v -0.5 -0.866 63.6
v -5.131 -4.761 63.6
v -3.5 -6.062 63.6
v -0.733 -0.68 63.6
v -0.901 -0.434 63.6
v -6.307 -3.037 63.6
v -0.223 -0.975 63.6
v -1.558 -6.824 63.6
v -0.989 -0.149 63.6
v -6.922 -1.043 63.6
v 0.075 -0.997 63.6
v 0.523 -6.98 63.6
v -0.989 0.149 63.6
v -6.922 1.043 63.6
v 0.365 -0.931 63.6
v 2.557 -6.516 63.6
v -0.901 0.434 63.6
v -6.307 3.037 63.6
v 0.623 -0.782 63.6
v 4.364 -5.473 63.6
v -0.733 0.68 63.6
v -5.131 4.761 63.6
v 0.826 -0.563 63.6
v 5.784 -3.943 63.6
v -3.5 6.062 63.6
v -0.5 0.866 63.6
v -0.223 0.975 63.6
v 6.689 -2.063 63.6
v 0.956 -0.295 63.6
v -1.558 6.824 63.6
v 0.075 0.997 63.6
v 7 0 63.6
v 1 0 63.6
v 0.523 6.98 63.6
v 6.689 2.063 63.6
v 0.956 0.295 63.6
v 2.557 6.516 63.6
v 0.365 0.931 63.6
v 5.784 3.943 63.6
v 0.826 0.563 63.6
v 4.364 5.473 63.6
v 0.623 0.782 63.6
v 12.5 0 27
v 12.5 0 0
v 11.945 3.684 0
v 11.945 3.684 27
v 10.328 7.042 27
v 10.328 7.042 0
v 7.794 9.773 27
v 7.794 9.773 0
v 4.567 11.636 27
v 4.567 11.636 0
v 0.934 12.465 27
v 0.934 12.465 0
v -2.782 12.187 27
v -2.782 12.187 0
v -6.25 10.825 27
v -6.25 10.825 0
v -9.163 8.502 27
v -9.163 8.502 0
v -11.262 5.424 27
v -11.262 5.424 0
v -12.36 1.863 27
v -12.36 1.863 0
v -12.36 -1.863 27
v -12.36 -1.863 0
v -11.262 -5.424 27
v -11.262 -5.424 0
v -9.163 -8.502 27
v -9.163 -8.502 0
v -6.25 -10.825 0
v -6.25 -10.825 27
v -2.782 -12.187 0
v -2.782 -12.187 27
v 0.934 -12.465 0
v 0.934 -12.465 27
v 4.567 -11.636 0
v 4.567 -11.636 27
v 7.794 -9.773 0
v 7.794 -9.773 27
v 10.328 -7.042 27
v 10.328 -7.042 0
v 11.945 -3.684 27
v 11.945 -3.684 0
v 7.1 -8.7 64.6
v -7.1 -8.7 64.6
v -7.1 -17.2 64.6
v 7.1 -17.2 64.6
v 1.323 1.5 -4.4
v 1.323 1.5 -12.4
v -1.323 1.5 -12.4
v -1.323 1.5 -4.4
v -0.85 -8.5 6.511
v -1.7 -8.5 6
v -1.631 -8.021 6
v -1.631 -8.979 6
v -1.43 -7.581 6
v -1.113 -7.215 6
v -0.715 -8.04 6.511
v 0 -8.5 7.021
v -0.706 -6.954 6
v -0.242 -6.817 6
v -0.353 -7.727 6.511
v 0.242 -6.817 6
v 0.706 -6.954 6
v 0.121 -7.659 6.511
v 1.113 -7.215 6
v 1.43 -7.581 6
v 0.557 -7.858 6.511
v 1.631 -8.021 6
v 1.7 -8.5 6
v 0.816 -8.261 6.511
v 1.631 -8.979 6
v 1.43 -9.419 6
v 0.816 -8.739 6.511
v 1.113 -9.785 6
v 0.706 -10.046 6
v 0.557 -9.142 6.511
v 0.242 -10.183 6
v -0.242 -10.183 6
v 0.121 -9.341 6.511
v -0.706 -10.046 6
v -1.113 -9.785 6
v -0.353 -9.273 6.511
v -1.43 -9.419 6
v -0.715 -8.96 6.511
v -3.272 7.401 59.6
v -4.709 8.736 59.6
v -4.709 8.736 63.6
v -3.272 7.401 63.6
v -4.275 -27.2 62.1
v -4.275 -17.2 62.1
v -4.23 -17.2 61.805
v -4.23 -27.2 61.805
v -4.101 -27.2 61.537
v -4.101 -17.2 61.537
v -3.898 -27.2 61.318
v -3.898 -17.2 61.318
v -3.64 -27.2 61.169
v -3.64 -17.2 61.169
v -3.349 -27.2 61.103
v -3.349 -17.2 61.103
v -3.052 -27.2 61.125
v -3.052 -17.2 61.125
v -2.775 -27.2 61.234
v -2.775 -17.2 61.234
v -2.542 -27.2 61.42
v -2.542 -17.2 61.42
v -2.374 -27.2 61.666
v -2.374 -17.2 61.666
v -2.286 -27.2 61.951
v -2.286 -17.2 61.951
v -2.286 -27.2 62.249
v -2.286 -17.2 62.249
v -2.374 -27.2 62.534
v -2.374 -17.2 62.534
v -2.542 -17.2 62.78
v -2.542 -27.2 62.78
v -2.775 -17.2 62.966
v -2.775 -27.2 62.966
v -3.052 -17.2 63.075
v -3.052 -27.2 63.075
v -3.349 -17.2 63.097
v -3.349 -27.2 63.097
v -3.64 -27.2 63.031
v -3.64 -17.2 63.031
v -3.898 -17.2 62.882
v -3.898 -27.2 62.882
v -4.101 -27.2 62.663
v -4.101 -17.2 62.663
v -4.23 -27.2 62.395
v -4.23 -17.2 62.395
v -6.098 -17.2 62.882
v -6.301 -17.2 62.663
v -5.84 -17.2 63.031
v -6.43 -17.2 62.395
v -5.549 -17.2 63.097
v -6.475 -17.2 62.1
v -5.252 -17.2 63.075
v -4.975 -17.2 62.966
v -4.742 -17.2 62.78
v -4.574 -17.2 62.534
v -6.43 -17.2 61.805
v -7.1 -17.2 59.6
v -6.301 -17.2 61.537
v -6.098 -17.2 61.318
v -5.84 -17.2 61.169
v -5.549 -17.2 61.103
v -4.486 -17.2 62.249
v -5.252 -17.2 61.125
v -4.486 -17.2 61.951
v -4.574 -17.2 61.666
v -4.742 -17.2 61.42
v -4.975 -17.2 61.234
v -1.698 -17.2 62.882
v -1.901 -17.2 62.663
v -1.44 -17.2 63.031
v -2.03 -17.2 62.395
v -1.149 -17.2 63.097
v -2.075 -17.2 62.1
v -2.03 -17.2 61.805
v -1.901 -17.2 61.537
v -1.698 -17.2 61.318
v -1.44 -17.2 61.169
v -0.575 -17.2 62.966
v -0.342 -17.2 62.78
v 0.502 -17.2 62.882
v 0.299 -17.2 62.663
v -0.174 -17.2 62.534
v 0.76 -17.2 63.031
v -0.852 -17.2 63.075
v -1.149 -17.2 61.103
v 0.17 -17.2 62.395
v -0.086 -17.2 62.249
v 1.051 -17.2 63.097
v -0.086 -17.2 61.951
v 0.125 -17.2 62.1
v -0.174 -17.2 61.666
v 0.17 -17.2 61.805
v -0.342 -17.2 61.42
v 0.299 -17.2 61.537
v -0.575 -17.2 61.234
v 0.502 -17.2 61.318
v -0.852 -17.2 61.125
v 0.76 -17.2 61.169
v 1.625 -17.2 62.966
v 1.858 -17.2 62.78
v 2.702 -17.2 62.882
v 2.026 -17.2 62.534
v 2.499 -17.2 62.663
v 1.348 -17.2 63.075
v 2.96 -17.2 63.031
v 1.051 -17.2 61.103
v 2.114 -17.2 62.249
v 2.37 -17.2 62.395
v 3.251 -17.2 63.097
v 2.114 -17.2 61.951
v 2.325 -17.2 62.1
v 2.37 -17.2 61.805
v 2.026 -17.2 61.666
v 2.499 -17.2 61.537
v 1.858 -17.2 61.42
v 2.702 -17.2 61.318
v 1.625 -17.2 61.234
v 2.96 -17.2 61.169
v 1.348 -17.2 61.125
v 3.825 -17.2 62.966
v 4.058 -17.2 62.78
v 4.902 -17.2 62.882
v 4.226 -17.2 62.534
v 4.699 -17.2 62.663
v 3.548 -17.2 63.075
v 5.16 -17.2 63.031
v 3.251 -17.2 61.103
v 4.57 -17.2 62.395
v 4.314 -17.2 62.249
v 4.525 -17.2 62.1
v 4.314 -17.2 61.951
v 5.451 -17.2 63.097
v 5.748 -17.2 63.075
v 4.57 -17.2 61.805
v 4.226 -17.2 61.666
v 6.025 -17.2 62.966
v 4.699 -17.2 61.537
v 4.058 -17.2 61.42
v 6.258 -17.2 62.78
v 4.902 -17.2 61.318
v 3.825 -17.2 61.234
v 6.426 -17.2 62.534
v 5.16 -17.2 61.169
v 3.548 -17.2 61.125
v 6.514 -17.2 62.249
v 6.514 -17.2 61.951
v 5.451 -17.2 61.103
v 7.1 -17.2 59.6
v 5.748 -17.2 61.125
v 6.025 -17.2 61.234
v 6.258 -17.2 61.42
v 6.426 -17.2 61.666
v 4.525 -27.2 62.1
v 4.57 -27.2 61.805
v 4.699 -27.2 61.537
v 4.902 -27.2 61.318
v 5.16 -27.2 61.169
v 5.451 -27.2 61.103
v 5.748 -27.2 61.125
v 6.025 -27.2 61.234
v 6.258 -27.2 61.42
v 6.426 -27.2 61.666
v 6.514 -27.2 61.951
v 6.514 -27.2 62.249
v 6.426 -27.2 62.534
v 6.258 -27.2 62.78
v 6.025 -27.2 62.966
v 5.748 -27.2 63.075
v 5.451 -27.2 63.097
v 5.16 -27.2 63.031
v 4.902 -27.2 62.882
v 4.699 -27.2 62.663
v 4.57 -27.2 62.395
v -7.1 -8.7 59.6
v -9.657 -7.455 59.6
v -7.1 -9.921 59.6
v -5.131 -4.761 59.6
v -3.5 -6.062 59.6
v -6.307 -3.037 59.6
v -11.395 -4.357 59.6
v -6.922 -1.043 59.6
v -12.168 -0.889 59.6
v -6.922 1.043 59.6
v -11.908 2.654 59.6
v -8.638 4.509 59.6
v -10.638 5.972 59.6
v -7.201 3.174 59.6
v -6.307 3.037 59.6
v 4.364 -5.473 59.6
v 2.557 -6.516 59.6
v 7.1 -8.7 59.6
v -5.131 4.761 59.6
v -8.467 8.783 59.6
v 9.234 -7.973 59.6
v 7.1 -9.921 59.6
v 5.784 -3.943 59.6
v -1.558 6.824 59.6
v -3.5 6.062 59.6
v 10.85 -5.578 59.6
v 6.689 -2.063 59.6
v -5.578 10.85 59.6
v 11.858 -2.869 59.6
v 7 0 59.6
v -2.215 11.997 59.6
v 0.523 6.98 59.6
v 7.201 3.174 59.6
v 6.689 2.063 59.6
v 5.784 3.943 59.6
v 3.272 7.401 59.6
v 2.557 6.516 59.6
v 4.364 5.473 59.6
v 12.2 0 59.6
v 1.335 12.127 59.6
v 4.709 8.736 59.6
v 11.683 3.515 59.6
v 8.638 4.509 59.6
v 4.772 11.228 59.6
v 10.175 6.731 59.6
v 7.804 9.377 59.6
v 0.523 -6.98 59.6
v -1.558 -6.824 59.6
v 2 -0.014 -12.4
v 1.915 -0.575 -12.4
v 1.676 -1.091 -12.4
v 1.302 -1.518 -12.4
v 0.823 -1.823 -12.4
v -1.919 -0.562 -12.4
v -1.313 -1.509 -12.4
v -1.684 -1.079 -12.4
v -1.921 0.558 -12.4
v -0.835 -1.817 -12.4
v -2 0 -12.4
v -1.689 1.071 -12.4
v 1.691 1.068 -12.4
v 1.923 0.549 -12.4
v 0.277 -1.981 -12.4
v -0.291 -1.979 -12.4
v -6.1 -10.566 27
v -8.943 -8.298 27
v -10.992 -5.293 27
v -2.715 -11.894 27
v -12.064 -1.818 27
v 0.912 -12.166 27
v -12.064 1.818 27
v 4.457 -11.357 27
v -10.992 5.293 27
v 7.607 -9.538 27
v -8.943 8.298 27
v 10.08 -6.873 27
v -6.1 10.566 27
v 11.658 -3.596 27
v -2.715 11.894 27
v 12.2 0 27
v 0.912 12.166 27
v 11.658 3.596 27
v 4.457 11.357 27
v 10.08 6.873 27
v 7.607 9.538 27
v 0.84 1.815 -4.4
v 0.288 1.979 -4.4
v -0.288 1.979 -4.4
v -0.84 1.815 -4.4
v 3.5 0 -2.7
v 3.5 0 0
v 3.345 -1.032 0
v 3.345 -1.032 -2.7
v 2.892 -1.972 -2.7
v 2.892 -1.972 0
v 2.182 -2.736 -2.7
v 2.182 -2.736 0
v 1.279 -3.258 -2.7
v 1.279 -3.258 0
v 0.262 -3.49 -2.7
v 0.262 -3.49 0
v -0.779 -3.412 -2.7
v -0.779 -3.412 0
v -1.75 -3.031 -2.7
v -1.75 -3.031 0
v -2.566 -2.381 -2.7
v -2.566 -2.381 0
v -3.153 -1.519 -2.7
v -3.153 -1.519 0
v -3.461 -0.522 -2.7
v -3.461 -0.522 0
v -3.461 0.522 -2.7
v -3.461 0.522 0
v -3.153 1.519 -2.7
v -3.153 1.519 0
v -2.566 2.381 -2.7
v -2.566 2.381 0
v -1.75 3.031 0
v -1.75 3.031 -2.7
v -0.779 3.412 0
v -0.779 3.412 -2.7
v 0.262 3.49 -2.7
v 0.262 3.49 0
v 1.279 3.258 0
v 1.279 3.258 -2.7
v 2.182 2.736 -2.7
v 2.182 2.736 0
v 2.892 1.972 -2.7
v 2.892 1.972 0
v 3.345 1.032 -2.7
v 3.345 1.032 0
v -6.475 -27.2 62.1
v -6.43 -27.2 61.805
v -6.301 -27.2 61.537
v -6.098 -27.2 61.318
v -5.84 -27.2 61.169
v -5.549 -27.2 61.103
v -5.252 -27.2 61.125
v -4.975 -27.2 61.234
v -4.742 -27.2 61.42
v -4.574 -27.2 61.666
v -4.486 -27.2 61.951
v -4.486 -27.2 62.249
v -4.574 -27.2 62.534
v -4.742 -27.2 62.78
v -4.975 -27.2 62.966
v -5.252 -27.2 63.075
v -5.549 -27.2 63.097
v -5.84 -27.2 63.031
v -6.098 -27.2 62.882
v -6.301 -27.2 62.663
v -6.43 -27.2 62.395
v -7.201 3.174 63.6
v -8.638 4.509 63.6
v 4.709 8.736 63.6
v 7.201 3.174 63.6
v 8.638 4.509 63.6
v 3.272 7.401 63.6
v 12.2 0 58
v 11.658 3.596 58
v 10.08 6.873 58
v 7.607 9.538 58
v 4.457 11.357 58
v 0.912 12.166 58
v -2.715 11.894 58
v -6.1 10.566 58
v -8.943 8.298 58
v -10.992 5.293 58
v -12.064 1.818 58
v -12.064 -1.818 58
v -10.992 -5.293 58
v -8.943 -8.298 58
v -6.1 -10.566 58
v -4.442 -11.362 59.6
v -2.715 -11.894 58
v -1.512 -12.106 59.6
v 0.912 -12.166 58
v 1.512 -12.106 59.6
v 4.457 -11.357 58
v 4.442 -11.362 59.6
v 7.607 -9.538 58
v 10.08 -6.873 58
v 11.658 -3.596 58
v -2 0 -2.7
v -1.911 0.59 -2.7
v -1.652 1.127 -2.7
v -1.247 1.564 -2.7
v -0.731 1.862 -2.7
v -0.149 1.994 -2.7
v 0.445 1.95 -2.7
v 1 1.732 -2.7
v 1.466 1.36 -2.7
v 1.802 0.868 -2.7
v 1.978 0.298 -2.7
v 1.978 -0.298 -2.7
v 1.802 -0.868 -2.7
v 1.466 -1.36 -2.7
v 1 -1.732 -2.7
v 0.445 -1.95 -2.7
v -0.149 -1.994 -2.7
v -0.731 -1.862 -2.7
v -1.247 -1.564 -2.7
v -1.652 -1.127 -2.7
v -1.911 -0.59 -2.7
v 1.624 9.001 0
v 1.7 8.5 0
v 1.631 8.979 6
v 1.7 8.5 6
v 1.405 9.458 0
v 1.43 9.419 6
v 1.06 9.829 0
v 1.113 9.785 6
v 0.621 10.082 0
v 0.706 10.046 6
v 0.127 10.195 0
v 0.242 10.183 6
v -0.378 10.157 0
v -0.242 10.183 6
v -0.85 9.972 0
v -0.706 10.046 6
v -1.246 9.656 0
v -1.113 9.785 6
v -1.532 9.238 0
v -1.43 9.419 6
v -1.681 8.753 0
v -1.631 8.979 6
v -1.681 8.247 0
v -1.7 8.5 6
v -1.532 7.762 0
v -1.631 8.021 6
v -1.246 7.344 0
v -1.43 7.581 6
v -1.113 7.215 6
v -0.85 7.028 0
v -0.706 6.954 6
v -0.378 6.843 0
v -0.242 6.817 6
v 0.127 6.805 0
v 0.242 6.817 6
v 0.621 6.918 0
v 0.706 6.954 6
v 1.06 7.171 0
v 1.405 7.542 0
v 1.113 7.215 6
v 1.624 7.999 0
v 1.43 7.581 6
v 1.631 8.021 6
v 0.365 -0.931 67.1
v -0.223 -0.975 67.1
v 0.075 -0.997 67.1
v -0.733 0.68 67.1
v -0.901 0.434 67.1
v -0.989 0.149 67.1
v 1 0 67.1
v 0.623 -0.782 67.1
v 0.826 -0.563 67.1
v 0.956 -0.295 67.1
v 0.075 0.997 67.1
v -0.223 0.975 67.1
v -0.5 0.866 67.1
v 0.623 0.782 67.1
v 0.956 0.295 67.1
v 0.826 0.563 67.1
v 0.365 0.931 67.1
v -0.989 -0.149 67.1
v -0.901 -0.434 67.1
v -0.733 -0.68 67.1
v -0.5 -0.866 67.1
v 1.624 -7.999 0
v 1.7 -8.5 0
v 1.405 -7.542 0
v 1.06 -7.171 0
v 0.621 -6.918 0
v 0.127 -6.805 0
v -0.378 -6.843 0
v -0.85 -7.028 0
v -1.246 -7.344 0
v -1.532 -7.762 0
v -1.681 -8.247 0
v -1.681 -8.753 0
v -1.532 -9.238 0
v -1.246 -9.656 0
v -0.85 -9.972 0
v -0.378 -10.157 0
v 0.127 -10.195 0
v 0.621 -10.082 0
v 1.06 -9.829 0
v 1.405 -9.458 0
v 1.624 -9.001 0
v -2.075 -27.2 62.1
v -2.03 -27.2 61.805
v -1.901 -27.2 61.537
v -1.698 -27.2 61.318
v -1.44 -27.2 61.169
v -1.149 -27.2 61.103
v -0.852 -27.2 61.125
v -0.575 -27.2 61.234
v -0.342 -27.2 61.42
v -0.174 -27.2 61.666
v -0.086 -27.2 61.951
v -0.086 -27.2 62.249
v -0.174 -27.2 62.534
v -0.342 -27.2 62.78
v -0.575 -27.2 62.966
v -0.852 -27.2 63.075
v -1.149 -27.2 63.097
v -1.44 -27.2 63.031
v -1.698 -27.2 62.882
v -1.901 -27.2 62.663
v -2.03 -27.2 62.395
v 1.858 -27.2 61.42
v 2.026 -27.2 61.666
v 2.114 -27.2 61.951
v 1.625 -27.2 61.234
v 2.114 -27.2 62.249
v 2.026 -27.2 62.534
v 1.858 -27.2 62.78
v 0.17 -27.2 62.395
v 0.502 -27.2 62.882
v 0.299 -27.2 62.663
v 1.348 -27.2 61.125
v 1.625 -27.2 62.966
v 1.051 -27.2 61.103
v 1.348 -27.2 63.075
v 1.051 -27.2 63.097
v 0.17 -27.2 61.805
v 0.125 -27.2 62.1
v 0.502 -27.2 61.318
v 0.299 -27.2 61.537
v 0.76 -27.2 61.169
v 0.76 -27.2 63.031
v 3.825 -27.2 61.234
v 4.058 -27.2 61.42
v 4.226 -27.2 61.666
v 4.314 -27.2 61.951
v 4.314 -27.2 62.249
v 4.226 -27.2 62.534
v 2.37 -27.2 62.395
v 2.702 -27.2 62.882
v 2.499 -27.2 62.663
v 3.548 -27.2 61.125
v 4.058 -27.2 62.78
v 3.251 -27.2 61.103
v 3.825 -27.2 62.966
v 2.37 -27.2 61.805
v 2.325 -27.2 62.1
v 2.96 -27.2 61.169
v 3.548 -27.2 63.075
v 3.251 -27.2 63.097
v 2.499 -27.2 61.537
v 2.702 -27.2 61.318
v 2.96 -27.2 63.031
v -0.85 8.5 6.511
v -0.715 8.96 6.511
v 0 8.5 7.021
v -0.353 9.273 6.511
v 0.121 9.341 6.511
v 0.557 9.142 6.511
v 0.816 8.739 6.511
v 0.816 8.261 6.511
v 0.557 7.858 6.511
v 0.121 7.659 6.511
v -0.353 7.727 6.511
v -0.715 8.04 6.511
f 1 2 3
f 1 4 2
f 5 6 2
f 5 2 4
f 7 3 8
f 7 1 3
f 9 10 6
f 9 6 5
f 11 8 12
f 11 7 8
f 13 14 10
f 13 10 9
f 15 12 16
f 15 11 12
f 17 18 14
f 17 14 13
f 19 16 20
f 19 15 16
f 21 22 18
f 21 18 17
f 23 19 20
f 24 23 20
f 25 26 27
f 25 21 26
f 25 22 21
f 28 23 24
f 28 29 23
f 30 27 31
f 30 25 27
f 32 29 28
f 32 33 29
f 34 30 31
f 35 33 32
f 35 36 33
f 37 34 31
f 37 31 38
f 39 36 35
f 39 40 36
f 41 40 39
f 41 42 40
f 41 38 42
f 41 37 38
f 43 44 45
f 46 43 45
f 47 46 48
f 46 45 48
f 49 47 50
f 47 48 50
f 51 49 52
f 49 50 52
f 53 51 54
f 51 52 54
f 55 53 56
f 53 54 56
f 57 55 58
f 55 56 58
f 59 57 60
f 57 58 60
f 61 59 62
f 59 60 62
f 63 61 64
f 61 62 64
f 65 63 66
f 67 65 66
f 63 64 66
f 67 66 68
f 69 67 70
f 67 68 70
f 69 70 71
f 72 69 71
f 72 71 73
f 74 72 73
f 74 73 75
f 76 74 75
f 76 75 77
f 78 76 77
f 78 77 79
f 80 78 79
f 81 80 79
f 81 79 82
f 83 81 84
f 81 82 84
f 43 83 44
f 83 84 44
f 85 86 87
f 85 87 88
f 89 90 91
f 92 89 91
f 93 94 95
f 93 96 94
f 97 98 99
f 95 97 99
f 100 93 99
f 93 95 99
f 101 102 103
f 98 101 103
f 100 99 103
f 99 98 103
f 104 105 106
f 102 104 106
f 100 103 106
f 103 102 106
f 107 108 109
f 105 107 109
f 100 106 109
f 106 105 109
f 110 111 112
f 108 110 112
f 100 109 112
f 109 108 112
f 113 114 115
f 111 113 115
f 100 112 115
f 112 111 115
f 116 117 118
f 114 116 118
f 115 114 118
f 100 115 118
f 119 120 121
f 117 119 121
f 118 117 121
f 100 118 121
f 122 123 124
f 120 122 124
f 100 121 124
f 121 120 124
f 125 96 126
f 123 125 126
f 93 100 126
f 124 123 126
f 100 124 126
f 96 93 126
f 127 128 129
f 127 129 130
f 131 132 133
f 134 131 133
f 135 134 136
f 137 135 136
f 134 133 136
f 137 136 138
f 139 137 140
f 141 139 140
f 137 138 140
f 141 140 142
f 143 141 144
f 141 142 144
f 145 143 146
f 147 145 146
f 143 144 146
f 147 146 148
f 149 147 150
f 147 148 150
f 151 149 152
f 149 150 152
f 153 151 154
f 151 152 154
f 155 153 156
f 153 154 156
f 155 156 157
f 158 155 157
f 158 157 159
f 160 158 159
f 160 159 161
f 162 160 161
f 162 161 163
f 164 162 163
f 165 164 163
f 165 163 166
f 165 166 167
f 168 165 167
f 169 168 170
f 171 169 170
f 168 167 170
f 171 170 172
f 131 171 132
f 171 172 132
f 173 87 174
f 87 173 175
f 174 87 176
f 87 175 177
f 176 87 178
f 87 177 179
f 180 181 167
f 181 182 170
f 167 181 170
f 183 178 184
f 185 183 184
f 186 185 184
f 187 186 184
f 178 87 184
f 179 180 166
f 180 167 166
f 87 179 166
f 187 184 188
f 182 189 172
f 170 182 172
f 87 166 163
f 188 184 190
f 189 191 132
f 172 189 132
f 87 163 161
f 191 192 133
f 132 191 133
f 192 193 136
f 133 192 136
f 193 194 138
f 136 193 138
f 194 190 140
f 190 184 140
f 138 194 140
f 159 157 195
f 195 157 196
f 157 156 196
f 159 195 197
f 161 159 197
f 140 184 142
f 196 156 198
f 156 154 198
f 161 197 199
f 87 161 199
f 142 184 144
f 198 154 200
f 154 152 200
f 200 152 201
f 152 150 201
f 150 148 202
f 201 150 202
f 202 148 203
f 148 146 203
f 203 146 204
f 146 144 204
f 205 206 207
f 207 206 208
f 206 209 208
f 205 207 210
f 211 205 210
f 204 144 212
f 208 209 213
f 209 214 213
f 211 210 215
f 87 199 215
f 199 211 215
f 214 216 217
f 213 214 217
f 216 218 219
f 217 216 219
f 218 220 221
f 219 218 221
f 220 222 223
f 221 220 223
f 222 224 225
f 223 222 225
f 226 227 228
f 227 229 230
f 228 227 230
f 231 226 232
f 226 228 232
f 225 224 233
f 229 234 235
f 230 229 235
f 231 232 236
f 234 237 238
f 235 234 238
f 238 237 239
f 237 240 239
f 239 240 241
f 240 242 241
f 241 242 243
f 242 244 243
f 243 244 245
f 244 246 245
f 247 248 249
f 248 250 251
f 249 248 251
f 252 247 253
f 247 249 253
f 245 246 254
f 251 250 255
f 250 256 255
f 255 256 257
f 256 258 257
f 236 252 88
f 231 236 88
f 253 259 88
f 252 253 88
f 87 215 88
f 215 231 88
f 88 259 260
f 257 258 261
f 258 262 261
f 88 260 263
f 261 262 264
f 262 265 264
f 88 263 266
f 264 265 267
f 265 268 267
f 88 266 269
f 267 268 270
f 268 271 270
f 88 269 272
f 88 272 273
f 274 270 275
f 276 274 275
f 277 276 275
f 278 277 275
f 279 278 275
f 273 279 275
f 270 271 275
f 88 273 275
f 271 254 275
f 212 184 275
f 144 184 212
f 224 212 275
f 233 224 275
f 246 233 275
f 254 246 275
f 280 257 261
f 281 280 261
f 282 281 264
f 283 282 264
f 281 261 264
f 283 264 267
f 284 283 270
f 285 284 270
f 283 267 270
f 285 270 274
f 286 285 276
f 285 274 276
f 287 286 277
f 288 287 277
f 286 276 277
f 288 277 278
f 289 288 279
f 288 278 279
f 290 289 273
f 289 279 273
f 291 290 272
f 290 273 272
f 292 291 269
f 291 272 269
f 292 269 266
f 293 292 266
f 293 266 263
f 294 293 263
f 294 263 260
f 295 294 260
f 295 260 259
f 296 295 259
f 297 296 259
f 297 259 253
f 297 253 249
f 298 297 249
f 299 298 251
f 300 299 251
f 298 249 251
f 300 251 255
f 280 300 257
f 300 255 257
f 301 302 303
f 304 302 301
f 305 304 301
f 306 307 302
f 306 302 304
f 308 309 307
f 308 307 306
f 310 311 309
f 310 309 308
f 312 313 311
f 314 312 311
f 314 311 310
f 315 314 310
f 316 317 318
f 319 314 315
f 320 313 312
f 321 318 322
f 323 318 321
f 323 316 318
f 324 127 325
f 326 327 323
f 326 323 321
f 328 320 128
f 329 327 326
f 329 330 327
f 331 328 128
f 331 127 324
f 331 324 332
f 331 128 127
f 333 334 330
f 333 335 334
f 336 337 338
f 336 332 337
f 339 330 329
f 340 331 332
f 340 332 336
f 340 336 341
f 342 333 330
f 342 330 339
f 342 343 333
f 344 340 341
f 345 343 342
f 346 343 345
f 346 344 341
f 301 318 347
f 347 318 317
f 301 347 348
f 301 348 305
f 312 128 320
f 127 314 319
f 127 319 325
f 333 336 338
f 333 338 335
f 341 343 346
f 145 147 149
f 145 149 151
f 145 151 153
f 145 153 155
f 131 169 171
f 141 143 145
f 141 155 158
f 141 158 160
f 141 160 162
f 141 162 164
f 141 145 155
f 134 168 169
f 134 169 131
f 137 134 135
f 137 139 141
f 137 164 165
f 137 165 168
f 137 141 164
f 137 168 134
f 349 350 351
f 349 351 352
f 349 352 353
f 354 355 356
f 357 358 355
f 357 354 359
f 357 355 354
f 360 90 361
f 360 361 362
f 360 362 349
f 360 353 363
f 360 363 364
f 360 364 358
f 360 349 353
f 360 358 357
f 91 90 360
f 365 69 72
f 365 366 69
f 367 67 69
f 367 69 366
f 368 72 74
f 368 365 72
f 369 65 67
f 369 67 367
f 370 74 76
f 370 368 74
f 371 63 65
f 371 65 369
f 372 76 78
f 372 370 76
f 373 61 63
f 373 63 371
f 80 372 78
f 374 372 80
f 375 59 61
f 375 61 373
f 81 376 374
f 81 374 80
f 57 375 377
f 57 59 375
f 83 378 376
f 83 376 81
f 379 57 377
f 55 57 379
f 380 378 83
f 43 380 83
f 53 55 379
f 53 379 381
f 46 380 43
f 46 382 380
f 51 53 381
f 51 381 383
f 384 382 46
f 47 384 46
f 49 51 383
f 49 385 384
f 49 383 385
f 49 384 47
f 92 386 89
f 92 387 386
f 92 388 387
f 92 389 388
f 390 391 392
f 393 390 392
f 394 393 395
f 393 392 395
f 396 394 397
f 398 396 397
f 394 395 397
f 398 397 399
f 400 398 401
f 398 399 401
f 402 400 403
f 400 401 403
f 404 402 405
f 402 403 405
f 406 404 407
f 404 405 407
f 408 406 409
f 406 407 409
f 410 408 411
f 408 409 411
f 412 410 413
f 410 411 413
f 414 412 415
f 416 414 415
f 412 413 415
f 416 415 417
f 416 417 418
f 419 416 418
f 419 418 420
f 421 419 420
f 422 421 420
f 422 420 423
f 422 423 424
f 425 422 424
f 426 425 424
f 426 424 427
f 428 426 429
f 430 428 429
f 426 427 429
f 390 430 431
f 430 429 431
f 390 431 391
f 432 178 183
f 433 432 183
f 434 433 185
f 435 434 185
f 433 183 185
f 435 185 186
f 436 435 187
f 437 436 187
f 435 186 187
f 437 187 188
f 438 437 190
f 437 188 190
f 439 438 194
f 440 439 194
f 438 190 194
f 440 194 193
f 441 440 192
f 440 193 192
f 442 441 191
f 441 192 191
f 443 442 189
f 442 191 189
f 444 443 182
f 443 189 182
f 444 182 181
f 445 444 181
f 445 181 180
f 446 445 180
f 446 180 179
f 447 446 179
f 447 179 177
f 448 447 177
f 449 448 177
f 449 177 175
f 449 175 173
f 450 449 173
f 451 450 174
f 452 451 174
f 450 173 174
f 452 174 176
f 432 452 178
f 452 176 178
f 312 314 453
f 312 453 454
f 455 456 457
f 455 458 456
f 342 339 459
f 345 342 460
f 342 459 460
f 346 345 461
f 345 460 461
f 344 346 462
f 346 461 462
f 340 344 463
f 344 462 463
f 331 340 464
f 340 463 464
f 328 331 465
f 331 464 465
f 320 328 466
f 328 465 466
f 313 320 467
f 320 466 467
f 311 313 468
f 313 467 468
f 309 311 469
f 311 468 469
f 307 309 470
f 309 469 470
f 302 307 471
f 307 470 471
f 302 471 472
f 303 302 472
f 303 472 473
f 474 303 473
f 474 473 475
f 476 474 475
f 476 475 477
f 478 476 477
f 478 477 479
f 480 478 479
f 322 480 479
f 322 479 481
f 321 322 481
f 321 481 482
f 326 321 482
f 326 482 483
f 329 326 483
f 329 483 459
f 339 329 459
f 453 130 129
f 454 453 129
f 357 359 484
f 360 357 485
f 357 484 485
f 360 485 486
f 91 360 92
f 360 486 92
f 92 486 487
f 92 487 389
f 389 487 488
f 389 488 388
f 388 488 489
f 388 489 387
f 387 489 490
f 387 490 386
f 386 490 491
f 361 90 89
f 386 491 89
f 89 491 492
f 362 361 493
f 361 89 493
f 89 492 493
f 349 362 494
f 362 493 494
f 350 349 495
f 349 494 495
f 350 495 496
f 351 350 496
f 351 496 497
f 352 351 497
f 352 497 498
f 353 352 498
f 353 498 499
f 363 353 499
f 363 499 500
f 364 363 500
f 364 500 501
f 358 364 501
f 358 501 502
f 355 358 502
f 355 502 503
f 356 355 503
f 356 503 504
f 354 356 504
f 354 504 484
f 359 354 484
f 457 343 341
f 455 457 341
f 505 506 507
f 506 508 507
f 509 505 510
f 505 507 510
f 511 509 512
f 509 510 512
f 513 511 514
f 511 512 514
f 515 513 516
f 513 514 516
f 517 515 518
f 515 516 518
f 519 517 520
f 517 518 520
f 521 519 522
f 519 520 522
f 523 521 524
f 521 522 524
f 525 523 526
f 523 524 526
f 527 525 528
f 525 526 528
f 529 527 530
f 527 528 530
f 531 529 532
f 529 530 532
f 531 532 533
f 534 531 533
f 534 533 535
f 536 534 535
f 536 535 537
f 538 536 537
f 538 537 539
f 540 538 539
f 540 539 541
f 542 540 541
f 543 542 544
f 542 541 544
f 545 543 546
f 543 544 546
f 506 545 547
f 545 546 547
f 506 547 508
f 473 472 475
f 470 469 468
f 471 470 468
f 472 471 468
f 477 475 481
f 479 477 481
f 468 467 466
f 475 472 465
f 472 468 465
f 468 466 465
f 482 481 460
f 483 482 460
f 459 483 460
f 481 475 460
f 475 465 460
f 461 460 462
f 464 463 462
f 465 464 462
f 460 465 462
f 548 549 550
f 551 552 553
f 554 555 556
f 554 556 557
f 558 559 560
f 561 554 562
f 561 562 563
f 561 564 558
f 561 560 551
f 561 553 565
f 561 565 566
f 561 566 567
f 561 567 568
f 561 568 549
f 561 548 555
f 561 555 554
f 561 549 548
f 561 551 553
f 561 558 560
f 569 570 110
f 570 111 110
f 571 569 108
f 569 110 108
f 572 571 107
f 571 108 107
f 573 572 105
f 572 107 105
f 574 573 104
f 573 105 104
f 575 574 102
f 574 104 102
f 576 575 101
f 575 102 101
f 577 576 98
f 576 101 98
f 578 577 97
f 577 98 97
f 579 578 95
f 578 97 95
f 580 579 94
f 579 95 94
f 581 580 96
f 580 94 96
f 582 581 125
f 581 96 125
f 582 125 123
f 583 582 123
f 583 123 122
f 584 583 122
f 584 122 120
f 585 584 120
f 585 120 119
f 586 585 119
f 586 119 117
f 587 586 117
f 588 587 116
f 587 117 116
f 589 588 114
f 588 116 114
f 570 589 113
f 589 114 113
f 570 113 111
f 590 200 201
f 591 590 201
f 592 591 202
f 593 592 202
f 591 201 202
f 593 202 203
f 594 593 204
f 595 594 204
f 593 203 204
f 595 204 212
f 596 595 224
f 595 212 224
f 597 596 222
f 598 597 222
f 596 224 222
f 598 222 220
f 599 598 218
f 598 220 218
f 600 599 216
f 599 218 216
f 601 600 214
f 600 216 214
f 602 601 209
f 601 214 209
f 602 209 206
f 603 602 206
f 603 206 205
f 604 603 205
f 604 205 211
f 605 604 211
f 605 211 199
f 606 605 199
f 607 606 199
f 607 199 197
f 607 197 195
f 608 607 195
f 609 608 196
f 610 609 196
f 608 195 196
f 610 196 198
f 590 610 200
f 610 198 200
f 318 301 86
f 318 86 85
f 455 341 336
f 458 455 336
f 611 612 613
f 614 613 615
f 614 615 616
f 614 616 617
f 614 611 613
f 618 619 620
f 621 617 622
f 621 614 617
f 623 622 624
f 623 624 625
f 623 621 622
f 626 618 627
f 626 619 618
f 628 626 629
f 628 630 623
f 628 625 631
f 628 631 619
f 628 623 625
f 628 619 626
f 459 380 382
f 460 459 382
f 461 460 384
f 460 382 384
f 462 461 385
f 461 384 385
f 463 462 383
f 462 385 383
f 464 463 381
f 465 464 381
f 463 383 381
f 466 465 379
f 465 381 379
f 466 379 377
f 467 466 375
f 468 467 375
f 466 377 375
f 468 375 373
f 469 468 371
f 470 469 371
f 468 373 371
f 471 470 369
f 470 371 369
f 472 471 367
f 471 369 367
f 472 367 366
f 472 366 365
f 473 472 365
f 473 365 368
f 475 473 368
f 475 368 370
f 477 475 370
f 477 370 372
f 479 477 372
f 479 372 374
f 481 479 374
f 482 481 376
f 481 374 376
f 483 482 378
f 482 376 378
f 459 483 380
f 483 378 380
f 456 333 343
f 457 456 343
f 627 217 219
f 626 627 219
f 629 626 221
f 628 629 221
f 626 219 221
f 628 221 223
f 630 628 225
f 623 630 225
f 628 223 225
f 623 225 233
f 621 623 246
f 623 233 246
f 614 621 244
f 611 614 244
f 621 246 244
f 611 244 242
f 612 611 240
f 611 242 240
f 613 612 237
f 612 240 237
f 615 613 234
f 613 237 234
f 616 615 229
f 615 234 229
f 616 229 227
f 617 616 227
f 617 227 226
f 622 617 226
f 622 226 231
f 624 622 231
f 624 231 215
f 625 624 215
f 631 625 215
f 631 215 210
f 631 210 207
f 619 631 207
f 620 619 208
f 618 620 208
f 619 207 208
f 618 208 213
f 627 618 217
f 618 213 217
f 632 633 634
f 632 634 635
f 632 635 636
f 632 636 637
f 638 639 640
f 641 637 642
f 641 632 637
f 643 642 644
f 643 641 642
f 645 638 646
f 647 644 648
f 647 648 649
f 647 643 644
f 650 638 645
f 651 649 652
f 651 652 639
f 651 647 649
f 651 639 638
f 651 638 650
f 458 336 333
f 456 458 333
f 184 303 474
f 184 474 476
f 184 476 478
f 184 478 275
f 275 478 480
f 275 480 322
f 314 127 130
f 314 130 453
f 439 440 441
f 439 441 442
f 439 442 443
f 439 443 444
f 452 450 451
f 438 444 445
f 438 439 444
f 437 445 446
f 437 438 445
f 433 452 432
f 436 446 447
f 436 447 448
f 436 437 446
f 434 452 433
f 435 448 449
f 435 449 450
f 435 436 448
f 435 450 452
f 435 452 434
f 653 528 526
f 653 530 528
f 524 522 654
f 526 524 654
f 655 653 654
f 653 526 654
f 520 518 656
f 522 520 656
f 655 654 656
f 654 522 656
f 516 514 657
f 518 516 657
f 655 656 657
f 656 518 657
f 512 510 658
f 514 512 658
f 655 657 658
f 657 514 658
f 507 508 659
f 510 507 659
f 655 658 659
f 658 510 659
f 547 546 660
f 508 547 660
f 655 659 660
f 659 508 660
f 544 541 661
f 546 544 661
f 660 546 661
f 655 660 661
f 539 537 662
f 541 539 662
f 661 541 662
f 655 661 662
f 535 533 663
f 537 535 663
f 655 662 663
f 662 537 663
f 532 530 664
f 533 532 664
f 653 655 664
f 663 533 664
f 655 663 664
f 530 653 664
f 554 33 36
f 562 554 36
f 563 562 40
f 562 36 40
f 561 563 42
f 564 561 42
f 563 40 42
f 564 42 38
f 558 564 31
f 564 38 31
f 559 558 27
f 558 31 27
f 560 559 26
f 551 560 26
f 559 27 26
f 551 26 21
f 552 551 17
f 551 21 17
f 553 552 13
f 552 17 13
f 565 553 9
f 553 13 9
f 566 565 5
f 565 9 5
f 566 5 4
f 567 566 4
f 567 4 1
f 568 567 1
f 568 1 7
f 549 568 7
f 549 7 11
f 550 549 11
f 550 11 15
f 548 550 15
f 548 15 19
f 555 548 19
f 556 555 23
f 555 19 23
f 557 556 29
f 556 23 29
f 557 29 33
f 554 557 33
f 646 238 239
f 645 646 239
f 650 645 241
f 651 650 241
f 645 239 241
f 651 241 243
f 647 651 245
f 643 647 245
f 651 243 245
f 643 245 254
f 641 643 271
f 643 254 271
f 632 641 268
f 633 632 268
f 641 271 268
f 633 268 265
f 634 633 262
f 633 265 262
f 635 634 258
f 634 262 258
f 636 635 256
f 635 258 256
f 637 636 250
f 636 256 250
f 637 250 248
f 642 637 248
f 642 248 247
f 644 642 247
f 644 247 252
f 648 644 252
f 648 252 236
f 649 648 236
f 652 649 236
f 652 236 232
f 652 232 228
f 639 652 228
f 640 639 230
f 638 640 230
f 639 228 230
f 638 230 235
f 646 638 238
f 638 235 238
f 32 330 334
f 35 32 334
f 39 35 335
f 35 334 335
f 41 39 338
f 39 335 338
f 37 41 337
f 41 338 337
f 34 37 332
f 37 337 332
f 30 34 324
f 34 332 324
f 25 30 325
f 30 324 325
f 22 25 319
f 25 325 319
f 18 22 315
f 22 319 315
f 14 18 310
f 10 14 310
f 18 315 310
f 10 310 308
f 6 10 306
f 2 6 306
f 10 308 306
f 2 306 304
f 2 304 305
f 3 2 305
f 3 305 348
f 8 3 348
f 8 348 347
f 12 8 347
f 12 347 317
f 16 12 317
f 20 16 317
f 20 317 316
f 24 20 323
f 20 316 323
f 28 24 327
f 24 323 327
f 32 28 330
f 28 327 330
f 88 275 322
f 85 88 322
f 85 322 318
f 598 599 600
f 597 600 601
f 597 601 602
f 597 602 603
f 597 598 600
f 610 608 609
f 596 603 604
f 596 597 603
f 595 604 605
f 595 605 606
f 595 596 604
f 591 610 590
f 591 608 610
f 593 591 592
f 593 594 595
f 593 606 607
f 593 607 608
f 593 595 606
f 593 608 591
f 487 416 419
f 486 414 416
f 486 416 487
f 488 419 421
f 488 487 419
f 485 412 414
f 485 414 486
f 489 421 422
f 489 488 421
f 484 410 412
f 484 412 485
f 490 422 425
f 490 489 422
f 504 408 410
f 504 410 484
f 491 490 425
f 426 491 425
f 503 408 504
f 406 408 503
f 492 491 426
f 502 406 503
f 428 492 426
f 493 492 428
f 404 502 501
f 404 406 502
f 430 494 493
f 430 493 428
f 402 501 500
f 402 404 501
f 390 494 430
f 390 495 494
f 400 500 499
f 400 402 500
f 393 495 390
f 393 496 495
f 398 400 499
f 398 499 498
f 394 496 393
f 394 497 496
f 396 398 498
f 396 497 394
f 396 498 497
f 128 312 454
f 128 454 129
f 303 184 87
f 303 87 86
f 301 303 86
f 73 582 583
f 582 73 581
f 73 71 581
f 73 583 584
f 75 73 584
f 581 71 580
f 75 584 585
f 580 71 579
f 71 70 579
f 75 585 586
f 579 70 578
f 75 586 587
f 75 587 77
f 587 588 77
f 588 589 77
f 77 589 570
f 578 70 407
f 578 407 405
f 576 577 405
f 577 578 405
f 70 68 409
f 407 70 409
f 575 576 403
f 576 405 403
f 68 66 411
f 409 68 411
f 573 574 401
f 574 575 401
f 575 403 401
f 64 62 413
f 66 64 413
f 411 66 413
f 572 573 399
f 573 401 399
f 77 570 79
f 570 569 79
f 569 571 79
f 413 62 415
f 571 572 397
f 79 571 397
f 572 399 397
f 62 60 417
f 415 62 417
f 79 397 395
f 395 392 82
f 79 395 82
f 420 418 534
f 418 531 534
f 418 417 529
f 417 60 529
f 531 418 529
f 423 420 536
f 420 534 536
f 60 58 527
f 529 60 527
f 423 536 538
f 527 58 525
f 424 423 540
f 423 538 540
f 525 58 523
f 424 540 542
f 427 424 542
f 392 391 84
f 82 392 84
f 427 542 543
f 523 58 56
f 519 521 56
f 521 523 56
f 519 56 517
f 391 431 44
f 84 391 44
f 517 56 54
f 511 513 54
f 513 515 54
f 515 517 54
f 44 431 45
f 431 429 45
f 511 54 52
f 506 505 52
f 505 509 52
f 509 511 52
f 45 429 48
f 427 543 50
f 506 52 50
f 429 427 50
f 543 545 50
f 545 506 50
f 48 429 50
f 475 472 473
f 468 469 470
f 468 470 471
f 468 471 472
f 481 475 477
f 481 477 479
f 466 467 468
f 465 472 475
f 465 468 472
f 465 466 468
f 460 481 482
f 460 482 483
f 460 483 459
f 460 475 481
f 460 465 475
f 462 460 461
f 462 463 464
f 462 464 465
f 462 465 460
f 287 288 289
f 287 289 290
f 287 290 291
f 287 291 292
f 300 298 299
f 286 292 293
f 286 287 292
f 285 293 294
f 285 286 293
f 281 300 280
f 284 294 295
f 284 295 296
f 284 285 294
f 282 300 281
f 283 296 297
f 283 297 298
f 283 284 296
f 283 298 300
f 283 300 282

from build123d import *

# Parameters (mm, degrees)
ESQUISSE1_R             = 12.5
BOSS_EXTRU_1_DEPTH      = 27
ESQUISSE5_R             = 3.5
BOSS_EXTRU_5_DEPTH      = 2.7
ESQUISSE6_R             = 2
BOSS_EXTRU_6_DEPTH      = 9.7
ESQUISSE7_W             = 2.645751312
ESQUISSE7_H             = 1.189235155
ENL_V_MAT_EXTRU_1_DEPTH = 8
D_GAGEMENT_M31_D        = 3.4
D_GAGEMENT_M31_DEPTH    = 6
D_GAGEMENT_M31_TIP      = 1.021463052
ESQUISSE2_R             = 12.2
BOSS_EXTRU_2_DEPTH      = 31
ESQUISSE3_R             = 12.2
BOSS_EXTRU_3_DEPTH      = 1.6
ESQUISSE4_R             = 7
BOSS_EXTRU_4_DEPTH      = 4
ESQUISSE14_R            = 1
BOSS_EXTRU_10_DEPTH     = 3.5
BOSS_EXTRU_8_DEPTH      = 4
ESQUISSE11_W            = 14.2
ESQUISSE11_H            = 8.5
BOSS_EXTRU_7_DEPTH      = 5
ESQUISSE13_R            = 1
BOSS_EXTRU_9_DEPTH      = 10


with BuildPart() as part:
    # Esquisse1 → Boss.-Extru.1 (new body)
    with BuildSketch(Plane.XY):
        Circle(ESQUISSE1_R)
    extrude(amount=BOSS_EXTRU_1_DEPTH)

    # Esquisse5 → Boss.-Extru.5 (add)
    with BuildSketch(Plane(origin=(0, 0, 0), x_dir=(-1, 0, 0), z_dir=(0, 0, -1))):
        with Locations(Location((0, 0, 0), (0, 0, 180))):
            Circle(ESQUISSE5_R)
    extrude(amount=BOSS_EXTRU_5_DEPTH)

    # Esquisse6 → Boss.-Extru.6 (add)
    with BuildSketch(Plane(origin=(0, 0, -2.7), x_dir=(-1, 0, 0), z_dir=(0, 0, -1))):
        Circle(ESQUISSE6_R)
    extrude(amount=BOSS_EXTRU_6_DEPTH)

    # Esquisse7 → Enlèv. mat.-Extru.1 (cut)
    with BuildSketch(Plane(origin=(0, 0, -12.4), x_dir=(-1, 0, 0), z_dir=(0, 0, -1))):
        with Locations((0, 2.094617578)):
            Rectangle(ESQUISSE7_W, ESQUISSE7_H)
    extrude(amount=-ENL_V_MAT_EXTRU_1_DEPTH, mode=Mode.SUBTRACT)

    # Dégagement M31
    with Locations(Plane(origin=(0, 0, 0), x_dir=(-1, 0, 0), z_dir=(0, 0, -1))):
        with Locations((0, 8.5), (0, -8.5)):
            Hole(D_GAGEMENT_M31_D / 2, depth=D_GAGEMENT_M31_DEPTH)
            with Locations((0, 0, -(D_GAGEMENT_M31_DEPTH + D_GAGEMENT_M31_TIP / 2))):  # 118° drill point
                Cone(0, D_GAGEMENT_M31_D / 2, D_GAGEMENT_M31_TIP, mode=Mode.SUBTRACT)

    # Esquisse2 → Boss.-Extru.2 (add)
    with BuildSketch(Plane.XY.offset(27)):
        Circle(ESQUISSE2_R)
    extrude(amount=BOSS_EXTRU_2_DEPTH)


with BuildPart() as body_2:
    # Esquisse3 → Boss.-Extru.3 (new body)
    with BuildSketch(Plane.XY.offset(58)):
        Circle(ESQUISSE3_R)
    extrude(amount=BOSS_EXTRU_3_DEPTH)

    # Esquisse4 → Boss.-Extru.4 (add)
    with BuildSketch(Plane.XY.offset(59.6)):
        Circle(ESQUISSE4_R)
    extrude(amount=BOSS_EXTRU_4_DEPTH)

    # Esquisse14 → Boss.-Extru.10 (add)
    with BuildSketch(Plane.XY.offset(63.6)):
        Circle(ESQUISSE14_R)
    extrude(amount=BOSS_EXTRU_10_DEPTH)

    # Esquisse12 → Boss.-Extru.8 (add)
    with BuildSketch(Plane.XY.offset(59.6)):
        Polygon((-8.637517892, 4.508988416), (-4.70937524, 8.736232329), (-3.272423838, 7.400953314), (-7.20056649, 3.173709401), align=None)
        Polygon((7.20056649, 3.173709401), (8.637517892, 4.508988416), (4.70937524, 8.736232329), (3.272423838, 7.400953314), align=None)
    extrude(amount=BOSS_EXTRU_8_DEPTH)

    # Esquisse11 → Boss.-Extru.7 (add)
    with BuildSketch(Plane.XY.offset(59.6)):
        with Locations((0, -12.95)):
            Rectangle(ESQUISSE11_W, ESQUISSE11_H)
    extrude(amount=BOSS_EXTRU_7_DEPTH)

    # Esquisse13 → Boss.-Extru.9 (add)
    with BuildSketch(Plane.XZ.offset(17.2)):
        with Locations(Location((-5.474703178, 62.1, 0), (0, 0, 180))):
            Circle(ESQUISSE13_R)
        with Locations(Location((-3.274703178, 62.1, 0), (0, 0, 180))):
            Circle(ESQUISSE13_R)
        with Locations(Location((-1.074703178, 62.1, 0), (0, 0, 180))):
            Circle(ESQUISSE13_R)
        with Locations(Location((1.125296822, 62.1, 0), (0, 0, 180))):
            Circle(ESQUISSE13_R)
        with Locations(Location((3.325296822, 62.1, 0), (0, 0, 180))):
            Circle(ESQUISSE13_R)
        with Locations(Location((5.525296822, 62.1, 0), (0, 0, 180))):
            Circle(ESQUISSE13_R)
    extrude(amount=BOSS_EXTRU_9_DEPTH)


solid = Compound([part.part, body_2.part])
